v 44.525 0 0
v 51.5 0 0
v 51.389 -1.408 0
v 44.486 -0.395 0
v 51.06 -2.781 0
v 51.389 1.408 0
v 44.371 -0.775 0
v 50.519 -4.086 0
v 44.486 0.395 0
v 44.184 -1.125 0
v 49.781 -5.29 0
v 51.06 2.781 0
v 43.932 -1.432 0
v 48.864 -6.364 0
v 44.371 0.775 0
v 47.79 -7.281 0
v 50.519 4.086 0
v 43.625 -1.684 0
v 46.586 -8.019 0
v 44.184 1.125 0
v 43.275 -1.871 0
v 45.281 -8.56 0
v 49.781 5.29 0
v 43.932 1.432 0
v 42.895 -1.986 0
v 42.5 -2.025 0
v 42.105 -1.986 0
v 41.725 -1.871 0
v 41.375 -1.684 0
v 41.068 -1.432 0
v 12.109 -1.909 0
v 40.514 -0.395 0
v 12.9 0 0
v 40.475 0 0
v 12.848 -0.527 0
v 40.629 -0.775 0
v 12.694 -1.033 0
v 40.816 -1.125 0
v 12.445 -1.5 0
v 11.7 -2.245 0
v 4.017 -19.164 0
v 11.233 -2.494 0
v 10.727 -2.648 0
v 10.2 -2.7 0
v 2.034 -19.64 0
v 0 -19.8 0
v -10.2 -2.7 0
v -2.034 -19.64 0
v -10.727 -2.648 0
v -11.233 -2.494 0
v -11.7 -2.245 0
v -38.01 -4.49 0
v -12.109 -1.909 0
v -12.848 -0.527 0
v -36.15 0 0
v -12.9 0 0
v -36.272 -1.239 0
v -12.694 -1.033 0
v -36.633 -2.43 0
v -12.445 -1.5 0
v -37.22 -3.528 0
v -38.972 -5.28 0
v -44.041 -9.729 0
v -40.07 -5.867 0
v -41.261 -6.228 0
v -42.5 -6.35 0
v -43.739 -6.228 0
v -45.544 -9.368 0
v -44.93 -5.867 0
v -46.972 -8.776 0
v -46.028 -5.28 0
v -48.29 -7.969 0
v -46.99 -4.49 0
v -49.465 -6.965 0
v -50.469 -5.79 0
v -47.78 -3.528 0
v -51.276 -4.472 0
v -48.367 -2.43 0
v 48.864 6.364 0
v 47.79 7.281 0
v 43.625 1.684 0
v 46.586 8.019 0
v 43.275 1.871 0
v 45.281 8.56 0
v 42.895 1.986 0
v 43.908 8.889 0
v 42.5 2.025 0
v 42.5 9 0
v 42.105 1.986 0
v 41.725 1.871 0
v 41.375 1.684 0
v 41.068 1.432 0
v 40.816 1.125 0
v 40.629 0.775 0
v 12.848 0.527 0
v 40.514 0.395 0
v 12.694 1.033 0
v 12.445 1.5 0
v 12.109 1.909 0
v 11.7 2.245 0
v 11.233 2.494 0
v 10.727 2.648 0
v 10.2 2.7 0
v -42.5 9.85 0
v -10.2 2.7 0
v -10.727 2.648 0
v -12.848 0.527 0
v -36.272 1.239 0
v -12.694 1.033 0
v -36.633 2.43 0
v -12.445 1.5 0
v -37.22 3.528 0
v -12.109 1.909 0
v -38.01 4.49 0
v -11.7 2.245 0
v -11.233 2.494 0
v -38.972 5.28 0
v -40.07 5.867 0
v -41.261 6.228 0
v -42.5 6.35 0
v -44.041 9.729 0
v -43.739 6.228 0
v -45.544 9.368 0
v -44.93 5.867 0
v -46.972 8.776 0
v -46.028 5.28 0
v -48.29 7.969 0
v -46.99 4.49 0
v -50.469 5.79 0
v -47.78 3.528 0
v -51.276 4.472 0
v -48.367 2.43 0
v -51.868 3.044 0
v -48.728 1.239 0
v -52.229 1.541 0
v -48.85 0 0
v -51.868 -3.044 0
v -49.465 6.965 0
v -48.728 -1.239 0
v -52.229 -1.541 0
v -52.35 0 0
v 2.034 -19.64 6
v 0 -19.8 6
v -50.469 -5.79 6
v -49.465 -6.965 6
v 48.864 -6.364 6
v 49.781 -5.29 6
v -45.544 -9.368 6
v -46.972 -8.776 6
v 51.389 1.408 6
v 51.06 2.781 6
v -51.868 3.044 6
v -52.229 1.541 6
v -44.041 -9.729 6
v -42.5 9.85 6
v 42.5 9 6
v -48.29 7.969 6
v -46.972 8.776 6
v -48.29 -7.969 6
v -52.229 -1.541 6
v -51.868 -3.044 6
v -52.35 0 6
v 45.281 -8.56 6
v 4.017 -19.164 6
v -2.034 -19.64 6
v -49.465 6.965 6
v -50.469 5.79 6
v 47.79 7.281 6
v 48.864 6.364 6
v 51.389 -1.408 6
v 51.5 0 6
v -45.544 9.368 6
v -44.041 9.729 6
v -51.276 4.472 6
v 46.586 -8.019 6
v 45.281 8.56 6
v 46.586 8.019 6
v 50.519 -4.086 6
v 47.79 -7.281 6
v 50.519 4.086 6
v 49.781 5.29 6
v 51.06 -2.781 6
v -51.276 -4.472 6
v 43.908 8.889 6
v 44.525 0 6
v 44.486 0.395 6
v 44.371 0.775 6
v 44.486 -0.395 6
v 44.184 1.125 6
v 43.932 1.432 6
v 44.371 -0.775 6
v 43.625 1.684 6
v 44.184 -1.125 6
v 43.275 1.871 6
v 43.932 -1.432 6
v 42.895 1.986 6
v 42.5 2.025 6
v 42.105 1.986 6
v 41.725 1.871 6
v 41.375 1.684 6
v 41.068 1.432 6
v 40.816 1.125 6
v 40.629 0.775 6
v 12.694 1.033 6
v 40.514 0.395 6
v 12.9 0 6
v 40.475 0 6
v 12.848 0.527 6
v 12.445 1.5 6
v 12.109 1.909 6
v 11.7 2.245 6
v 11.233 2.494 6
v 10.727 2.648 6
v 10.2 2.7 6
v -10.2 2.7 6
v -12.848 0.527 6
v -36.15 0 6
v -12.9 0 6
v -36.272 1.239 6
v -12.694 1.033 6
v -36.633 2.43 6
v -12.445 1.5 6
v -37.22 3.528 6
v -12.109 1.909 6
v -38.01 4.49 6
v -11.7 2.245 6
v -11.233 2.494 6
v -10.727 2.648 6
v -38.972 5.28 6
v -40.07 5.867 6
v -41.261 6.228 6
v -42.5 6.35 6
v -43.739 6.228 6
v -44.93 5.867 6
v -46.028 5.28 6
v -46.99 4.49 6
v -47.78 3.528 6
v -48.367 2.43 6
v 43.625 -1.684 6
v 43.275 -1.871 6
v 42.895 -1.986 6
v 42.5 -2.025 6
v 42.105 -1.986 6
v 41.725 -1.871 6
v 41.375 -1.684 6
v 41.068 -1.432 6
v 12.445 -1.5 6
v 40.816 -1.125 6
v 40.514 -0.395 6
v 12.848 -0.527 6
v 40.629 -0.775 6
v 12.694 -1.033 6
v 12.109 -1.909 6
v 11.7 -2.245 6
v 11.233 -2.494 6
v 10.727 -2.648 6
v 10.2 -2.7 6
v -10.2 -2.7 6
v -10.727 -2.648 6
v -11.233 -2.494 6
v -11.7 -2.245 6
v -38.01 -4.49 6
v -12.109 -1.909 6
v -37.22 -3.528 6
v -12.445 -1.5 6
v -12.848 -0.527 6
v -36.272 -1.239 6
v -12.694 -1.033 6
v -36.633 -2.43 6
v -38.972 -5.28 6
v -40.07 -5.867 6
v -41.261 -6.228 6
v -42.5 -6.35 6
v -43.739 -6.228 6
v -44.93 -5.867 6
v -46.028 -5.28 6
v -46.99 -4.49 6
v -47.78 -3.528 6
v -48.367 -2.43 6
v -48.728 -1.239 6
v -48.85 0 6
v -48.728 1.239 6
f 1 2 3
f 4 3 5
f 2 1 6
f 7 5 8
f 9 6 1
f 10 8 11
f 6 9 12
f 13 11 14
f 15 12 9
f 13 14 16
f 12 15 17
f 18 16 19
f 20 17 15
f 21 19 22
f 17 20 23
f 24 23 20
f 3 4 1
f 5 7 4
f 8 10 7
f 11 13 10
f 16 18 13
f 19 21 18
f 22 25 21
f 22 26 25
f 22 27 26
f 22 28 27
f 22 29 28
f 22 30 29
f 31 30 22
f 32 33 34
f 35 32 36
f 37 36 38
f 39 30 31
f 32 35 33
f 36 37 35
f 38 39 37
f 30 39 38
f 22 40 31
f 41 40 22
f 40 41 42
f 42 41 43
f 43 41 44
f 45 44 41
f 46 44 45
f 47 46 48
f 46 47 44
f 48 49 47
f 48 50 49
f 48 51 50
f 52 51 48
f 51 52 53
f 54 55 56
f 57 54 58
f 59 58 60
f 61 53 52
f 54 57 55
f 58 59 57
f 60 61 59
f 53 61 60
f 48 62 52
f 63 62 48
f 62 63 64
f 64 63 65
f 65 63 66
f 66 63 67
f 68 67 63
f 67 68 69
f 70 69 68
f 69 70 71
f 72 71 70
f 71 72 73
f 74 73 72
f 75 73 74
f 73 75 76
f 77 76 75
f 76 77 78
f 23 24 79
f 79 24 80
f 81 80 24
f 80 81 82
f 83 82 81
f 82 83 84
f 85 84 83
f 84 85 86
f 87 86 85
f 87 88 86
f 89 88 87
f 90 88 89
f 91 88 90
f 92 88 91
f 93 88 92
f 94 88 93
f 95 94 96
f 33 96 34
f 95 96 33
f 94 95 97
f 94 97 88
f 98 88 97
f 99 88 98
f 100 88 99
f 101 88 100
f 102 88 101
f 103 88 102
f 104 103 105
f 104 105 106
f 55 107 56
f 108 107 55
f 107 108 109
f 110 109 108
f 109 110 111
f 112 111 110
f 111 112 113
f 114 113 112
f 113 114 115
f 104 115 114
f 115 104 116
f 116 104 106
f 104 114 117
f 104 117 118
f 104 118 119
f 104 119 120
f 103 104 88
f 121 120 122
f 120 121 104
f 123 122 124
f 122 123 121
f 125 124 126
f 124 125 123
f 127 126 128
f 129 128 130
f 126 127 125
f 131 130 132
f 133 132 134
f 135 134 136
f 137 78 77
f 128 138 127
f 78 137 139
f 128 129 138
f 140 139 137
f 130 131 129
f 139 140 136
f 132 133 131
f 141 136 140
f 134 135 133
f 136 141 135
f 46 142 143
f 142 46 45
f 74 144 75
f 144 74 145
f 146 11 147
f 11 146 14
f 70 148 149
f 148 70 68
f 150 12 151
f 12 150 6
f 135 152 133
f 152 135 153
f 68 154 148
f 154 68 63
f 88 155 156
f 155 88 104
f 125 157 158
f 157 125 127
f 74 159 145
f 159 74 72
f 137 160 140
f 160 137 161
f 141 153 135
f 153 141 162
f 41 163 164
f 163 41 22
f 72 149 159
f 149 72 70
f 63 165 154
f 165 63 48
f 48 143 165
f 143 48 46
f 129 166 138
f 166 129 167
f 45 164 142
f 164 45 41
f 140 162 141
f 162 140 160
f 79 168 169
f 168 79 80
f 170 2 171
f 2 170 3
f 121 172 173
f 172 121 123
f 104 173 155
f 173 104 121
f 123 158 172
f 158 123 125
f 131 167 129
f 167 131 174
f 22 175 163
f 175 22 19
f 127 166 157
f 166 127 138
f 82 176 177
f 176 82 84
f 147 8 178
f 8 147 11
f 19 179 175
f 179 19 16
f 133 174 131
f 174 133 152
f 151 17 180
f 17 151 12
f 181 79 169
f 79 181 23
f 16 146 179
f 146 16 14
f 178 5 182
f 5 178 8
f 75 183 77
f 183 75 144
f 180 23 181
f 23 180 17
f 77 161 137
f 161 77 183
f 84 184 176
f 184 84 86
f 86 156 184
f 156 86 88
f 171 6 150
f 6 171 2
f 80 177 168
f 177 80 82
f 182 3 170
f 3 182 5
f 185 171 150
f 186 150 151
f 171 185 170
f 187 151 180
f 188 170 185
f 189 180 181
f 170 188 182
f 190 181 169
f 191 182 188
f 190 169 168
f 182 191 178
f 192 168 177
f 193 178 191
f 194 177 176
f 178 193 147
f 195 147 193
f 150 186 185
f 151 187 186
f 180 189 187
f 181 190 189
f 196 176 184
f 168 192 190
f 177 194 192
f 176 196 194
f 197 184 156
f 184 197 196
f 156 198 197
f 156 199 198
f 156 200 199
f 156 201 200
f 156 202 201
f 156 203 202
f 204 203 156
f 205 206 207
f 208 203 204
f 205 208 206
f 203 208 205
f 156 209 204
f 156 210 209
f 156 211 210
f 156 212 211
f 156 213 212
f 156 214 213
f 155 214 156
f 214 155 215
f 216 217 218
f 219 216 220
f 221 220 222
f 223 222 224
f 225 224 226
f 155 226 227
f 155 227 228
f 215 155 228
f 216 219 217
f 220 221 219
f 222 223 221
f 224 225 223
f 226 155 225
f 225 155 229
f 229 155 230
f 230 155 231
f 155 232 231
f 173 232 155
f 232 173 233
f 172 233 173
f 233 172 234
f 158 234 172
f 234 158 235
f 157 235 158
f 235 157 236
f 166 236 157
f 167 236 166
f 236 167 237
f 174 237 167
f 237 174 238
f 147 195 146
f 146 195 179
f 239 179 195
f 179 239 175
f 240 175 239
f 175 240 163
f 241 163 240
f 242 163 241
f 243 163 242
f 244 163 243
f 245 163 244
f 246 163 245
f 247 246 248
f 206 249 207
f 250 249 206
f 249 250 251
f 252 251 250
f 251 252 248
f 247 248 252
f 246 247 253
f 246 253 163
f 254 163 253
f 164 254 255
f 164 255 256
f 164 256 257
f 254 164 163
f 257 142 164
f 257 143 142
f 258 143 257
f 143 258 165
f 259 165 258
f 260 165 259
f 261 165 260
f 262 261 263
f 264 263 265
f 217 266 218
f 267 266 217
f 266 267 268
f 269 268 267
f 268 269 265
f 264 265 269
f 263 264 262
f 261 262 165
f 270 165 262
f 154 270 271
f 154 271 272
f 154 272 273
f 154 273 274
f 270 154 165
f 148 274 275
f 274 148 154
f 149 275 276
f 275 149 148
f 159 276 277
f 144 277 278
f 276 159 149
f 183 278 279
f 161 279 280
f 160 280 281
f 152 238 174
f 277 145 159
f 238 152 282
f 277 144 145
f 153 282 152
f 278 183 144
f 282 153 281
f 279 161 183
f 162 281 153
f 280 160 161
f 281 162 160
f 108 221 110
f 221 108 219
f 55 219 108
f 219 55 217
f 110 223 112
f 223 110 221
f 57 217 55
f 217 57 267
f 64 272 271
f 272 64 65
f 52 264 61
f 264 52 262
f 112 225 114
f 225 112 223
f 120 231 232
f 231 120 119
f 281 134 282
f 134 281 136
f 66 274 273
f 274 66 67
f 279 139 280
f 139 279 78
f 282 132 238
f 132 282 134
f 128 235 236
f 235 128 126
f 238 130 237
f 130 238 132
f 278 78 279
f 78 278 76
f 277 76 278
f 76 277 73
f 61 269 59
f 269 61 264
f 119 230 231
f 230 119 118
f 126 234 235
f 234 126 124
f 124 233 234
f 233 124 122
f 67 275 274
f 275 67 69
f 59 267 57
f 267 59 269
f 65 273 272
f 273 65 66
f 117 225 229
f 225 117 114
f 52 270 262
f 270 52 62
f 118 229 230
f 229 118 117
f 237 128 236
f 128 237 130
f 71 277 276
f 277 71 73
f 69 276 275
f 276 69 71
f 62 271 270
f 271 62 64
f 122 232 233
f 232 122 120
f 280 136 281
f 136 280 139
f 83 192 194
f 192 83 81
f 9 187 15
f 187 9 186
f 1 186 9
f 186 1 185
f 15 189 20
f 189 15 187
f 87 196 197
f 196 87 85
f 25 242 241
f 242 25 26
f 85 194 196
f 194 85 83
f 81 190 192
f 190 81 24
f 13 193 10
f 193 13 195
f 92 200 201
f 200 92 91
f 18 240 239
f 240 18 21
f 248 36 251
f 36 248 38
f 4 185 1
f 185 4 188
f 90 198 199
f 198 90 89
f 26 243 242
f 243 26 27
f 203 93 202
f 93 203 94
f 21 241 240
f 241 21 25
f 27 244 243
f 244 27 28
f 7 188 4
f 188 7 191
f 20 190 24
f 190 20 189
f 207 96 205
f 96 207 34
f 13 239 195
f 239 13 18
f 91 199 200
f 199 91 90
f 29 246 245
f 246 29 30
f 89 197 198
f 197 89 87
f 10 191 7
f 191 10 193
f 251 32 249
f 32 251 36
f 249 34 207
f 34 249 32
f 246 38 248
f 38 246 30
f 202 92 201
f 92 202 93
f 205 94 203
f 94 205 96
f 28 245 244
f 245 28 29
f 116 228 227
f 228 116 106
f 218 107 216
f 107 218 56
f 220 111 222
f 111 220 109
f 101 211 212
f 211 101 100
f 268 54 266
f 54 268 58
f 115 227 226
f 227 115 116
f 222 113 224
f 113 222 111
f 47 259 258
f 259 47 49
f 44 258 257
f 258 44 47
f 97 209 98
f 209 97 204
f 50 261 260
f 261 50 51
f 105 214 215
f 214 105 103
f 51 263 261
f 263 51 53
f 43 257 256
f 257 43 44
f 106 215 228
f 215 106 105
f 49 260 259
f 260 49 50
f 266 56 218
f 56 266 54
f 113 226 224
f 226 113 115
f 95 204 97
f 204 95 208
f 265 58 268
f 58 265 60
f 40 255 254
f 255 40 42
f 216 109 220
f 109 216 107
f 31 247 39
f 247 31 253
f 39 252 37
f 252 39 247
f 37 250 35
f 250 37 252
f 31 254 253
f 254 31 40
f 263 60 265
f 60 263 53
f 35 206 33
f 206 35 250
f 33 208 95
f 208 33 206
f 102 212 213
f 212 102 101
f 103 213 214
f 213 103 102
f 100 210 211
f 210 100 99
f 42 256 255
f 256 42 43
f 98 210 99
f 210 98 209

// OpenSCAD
$fn = 32;

// ----------------------------------------------------------------------
// Lever: 85 mm between the bosses, 6 mm thick, smooth outline
// ----------------------------------------------------------------------

// --- parameters (mm) ---
lever_l = 85;             // distance between the boss centres
boss_a = 19.7;            // first boss diameter
boss_b = 18;              // second boss diameter
bore_a = 12.7;            // first bore
bore_b = 4.05;            // second bore
lever_t = 6;              // lever thickness
boss_c = 26;              // middle boss diameter
bend = 6.8;               // how far the middle boss drops
slot_w = 5.4;             // adjustment slot width

lever_profile = [[-52.35, 0], [-52.229, -1.541], [-51.868, -3.044], [-51.276, -4.472], [-50.469, -5.79], [-49.465, -6.965], [-48.29, -7.969], [-46.972, -8.776], [-45.544, -9.368], [-44.041, -9.729], [-2.034, -19.64], [0, -19.8], [2.034, -19.64], [4.017, -19.164], [45.281, -8.56], [46.586, -8.019], [47.79, -7.281], [48.864, -6.364], [49.781, -5.29], [50.519, -4.086], [51.06, -2.781], [51.389, -1.408], [51.5, 0], [51.389, 1.408], [51.06, 2.781], [50.519, 4.086], [49.781, 5.29], [48.864, 6.364], [47.79, 7.281], [46.586, 8.019], [45.281, 8.56], [43.908, 8.889], [42.5, 9], [-42.5, 9.85], [-44.041, 9.729], [-45.544, 9.368], [-46.972, 8.776], [-48.29, 7.969], [-49.465, 6.965], [-50.469, 5.79], [-51.276, 4.472], [-51.868, 3.044], [-52.229, 1.541]];

difference() {
  linear_extrude(height = lever_t) polygon(lever_profile);
  translate([-42.5, 0, -2.5]) cylinder(h = lever_t + 5, d = bore_a);
  translate([42.5, 0, -2.5]) cylinder(h = lever_t + 5, d = bore_b);
  /* slotted adjustment, stadium shaped */
  hull() {
    translate([-10.2, 0, -2.5]) cylinder(h = lever_t + 5, d = slot_w);
    translate([10.2, 0, -2.5]) cylinder(h = lever_t + 5, d = slot_w);
  }
}
